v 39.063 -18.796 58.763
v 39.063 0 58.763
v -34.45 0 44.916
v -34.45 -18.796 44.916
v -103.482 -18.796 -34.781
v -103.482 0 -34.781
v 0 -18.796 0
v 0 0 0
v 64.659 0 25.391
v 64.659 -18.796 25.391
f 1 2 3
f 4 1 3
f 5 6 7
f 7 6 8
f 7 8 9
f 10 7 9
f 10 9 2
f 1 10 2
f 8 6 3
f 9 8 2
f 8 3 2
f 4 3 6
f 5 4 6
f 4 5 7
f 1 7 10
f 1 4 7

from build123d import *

# Parameters (mm, degrees)
F1_DEPTH = 18.796


# Not quite as in the source:
# - the program builds the solid bodies; features that only make, move or delete a surface that nothing else refers to are left out


with BuildPart() as f1:
    # F0 (on Front) → F1 (new body)
    with BuildSketch(Plane.XZ):
        Polygon((-34.4498695163, 44.9158253761), (0, 0), (64.659229215, 25.390607867), (39.0626974404, 58.7634295225), align=None)
        Polygon((-103.4818813205, -34.7814559937), (0, 0), (-34.4498695163, 44.9158253761), align=None)
    extrude(amount=F1_DEPTH)


solid = f1.part
